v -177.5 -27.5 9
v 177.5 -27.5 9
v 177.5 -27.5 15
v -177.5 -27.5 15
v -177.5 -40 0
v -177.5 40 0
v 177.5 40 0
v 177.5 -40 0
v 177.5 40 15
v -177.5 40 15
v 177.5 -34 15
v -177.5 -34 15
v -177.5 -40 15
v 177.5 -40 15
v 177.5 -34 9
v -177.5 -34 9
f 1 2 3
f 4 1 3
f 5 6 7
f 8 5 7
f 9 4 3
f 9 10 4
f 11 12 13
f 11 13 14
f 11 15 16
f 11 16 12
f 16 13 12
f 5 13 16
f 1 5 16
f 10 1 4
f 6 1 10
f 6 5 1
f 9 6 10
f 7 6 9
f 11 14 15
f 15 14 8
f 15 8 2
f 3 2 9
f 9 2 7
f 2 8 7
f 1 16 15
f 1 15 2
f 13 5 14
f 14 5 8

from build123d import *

# Parameters (mm, degrees)
SKETCH_W          = 355
SKETCH_H          = 80
PAD_DEPTH         = 15
SKETCH001_W       = 6.5
SKETCH001_H       = 6
POCKET_DEPTH      = 177.501
POCKET_DEPTH_BACK = -177.501


with BuildPart() as part:
    # Sketch → Pad (new body)
    with BuildSketch(Plane.XY):
        Rectangle(SKETCH_W, SKETCH_H)
    extrude(amount=PAD_DEPTH)

    # Sketch001 → Pocket (cut, two sides)
    with BuildSketch(Plane.YZ) as pocket_sk:
        with Locations((-30.75, 12)):
            Rectangle(SKETCH001_W, SKETCH001_H)
    extrude(amount=-POCKET_DEPTH, mode=Mode.SUBTRACT)
    extrude(pocket_sk.sketch, amount=-POCKET_DEPTH_BACK, mode=Mode.SUBTRACT)


solid = part.part
